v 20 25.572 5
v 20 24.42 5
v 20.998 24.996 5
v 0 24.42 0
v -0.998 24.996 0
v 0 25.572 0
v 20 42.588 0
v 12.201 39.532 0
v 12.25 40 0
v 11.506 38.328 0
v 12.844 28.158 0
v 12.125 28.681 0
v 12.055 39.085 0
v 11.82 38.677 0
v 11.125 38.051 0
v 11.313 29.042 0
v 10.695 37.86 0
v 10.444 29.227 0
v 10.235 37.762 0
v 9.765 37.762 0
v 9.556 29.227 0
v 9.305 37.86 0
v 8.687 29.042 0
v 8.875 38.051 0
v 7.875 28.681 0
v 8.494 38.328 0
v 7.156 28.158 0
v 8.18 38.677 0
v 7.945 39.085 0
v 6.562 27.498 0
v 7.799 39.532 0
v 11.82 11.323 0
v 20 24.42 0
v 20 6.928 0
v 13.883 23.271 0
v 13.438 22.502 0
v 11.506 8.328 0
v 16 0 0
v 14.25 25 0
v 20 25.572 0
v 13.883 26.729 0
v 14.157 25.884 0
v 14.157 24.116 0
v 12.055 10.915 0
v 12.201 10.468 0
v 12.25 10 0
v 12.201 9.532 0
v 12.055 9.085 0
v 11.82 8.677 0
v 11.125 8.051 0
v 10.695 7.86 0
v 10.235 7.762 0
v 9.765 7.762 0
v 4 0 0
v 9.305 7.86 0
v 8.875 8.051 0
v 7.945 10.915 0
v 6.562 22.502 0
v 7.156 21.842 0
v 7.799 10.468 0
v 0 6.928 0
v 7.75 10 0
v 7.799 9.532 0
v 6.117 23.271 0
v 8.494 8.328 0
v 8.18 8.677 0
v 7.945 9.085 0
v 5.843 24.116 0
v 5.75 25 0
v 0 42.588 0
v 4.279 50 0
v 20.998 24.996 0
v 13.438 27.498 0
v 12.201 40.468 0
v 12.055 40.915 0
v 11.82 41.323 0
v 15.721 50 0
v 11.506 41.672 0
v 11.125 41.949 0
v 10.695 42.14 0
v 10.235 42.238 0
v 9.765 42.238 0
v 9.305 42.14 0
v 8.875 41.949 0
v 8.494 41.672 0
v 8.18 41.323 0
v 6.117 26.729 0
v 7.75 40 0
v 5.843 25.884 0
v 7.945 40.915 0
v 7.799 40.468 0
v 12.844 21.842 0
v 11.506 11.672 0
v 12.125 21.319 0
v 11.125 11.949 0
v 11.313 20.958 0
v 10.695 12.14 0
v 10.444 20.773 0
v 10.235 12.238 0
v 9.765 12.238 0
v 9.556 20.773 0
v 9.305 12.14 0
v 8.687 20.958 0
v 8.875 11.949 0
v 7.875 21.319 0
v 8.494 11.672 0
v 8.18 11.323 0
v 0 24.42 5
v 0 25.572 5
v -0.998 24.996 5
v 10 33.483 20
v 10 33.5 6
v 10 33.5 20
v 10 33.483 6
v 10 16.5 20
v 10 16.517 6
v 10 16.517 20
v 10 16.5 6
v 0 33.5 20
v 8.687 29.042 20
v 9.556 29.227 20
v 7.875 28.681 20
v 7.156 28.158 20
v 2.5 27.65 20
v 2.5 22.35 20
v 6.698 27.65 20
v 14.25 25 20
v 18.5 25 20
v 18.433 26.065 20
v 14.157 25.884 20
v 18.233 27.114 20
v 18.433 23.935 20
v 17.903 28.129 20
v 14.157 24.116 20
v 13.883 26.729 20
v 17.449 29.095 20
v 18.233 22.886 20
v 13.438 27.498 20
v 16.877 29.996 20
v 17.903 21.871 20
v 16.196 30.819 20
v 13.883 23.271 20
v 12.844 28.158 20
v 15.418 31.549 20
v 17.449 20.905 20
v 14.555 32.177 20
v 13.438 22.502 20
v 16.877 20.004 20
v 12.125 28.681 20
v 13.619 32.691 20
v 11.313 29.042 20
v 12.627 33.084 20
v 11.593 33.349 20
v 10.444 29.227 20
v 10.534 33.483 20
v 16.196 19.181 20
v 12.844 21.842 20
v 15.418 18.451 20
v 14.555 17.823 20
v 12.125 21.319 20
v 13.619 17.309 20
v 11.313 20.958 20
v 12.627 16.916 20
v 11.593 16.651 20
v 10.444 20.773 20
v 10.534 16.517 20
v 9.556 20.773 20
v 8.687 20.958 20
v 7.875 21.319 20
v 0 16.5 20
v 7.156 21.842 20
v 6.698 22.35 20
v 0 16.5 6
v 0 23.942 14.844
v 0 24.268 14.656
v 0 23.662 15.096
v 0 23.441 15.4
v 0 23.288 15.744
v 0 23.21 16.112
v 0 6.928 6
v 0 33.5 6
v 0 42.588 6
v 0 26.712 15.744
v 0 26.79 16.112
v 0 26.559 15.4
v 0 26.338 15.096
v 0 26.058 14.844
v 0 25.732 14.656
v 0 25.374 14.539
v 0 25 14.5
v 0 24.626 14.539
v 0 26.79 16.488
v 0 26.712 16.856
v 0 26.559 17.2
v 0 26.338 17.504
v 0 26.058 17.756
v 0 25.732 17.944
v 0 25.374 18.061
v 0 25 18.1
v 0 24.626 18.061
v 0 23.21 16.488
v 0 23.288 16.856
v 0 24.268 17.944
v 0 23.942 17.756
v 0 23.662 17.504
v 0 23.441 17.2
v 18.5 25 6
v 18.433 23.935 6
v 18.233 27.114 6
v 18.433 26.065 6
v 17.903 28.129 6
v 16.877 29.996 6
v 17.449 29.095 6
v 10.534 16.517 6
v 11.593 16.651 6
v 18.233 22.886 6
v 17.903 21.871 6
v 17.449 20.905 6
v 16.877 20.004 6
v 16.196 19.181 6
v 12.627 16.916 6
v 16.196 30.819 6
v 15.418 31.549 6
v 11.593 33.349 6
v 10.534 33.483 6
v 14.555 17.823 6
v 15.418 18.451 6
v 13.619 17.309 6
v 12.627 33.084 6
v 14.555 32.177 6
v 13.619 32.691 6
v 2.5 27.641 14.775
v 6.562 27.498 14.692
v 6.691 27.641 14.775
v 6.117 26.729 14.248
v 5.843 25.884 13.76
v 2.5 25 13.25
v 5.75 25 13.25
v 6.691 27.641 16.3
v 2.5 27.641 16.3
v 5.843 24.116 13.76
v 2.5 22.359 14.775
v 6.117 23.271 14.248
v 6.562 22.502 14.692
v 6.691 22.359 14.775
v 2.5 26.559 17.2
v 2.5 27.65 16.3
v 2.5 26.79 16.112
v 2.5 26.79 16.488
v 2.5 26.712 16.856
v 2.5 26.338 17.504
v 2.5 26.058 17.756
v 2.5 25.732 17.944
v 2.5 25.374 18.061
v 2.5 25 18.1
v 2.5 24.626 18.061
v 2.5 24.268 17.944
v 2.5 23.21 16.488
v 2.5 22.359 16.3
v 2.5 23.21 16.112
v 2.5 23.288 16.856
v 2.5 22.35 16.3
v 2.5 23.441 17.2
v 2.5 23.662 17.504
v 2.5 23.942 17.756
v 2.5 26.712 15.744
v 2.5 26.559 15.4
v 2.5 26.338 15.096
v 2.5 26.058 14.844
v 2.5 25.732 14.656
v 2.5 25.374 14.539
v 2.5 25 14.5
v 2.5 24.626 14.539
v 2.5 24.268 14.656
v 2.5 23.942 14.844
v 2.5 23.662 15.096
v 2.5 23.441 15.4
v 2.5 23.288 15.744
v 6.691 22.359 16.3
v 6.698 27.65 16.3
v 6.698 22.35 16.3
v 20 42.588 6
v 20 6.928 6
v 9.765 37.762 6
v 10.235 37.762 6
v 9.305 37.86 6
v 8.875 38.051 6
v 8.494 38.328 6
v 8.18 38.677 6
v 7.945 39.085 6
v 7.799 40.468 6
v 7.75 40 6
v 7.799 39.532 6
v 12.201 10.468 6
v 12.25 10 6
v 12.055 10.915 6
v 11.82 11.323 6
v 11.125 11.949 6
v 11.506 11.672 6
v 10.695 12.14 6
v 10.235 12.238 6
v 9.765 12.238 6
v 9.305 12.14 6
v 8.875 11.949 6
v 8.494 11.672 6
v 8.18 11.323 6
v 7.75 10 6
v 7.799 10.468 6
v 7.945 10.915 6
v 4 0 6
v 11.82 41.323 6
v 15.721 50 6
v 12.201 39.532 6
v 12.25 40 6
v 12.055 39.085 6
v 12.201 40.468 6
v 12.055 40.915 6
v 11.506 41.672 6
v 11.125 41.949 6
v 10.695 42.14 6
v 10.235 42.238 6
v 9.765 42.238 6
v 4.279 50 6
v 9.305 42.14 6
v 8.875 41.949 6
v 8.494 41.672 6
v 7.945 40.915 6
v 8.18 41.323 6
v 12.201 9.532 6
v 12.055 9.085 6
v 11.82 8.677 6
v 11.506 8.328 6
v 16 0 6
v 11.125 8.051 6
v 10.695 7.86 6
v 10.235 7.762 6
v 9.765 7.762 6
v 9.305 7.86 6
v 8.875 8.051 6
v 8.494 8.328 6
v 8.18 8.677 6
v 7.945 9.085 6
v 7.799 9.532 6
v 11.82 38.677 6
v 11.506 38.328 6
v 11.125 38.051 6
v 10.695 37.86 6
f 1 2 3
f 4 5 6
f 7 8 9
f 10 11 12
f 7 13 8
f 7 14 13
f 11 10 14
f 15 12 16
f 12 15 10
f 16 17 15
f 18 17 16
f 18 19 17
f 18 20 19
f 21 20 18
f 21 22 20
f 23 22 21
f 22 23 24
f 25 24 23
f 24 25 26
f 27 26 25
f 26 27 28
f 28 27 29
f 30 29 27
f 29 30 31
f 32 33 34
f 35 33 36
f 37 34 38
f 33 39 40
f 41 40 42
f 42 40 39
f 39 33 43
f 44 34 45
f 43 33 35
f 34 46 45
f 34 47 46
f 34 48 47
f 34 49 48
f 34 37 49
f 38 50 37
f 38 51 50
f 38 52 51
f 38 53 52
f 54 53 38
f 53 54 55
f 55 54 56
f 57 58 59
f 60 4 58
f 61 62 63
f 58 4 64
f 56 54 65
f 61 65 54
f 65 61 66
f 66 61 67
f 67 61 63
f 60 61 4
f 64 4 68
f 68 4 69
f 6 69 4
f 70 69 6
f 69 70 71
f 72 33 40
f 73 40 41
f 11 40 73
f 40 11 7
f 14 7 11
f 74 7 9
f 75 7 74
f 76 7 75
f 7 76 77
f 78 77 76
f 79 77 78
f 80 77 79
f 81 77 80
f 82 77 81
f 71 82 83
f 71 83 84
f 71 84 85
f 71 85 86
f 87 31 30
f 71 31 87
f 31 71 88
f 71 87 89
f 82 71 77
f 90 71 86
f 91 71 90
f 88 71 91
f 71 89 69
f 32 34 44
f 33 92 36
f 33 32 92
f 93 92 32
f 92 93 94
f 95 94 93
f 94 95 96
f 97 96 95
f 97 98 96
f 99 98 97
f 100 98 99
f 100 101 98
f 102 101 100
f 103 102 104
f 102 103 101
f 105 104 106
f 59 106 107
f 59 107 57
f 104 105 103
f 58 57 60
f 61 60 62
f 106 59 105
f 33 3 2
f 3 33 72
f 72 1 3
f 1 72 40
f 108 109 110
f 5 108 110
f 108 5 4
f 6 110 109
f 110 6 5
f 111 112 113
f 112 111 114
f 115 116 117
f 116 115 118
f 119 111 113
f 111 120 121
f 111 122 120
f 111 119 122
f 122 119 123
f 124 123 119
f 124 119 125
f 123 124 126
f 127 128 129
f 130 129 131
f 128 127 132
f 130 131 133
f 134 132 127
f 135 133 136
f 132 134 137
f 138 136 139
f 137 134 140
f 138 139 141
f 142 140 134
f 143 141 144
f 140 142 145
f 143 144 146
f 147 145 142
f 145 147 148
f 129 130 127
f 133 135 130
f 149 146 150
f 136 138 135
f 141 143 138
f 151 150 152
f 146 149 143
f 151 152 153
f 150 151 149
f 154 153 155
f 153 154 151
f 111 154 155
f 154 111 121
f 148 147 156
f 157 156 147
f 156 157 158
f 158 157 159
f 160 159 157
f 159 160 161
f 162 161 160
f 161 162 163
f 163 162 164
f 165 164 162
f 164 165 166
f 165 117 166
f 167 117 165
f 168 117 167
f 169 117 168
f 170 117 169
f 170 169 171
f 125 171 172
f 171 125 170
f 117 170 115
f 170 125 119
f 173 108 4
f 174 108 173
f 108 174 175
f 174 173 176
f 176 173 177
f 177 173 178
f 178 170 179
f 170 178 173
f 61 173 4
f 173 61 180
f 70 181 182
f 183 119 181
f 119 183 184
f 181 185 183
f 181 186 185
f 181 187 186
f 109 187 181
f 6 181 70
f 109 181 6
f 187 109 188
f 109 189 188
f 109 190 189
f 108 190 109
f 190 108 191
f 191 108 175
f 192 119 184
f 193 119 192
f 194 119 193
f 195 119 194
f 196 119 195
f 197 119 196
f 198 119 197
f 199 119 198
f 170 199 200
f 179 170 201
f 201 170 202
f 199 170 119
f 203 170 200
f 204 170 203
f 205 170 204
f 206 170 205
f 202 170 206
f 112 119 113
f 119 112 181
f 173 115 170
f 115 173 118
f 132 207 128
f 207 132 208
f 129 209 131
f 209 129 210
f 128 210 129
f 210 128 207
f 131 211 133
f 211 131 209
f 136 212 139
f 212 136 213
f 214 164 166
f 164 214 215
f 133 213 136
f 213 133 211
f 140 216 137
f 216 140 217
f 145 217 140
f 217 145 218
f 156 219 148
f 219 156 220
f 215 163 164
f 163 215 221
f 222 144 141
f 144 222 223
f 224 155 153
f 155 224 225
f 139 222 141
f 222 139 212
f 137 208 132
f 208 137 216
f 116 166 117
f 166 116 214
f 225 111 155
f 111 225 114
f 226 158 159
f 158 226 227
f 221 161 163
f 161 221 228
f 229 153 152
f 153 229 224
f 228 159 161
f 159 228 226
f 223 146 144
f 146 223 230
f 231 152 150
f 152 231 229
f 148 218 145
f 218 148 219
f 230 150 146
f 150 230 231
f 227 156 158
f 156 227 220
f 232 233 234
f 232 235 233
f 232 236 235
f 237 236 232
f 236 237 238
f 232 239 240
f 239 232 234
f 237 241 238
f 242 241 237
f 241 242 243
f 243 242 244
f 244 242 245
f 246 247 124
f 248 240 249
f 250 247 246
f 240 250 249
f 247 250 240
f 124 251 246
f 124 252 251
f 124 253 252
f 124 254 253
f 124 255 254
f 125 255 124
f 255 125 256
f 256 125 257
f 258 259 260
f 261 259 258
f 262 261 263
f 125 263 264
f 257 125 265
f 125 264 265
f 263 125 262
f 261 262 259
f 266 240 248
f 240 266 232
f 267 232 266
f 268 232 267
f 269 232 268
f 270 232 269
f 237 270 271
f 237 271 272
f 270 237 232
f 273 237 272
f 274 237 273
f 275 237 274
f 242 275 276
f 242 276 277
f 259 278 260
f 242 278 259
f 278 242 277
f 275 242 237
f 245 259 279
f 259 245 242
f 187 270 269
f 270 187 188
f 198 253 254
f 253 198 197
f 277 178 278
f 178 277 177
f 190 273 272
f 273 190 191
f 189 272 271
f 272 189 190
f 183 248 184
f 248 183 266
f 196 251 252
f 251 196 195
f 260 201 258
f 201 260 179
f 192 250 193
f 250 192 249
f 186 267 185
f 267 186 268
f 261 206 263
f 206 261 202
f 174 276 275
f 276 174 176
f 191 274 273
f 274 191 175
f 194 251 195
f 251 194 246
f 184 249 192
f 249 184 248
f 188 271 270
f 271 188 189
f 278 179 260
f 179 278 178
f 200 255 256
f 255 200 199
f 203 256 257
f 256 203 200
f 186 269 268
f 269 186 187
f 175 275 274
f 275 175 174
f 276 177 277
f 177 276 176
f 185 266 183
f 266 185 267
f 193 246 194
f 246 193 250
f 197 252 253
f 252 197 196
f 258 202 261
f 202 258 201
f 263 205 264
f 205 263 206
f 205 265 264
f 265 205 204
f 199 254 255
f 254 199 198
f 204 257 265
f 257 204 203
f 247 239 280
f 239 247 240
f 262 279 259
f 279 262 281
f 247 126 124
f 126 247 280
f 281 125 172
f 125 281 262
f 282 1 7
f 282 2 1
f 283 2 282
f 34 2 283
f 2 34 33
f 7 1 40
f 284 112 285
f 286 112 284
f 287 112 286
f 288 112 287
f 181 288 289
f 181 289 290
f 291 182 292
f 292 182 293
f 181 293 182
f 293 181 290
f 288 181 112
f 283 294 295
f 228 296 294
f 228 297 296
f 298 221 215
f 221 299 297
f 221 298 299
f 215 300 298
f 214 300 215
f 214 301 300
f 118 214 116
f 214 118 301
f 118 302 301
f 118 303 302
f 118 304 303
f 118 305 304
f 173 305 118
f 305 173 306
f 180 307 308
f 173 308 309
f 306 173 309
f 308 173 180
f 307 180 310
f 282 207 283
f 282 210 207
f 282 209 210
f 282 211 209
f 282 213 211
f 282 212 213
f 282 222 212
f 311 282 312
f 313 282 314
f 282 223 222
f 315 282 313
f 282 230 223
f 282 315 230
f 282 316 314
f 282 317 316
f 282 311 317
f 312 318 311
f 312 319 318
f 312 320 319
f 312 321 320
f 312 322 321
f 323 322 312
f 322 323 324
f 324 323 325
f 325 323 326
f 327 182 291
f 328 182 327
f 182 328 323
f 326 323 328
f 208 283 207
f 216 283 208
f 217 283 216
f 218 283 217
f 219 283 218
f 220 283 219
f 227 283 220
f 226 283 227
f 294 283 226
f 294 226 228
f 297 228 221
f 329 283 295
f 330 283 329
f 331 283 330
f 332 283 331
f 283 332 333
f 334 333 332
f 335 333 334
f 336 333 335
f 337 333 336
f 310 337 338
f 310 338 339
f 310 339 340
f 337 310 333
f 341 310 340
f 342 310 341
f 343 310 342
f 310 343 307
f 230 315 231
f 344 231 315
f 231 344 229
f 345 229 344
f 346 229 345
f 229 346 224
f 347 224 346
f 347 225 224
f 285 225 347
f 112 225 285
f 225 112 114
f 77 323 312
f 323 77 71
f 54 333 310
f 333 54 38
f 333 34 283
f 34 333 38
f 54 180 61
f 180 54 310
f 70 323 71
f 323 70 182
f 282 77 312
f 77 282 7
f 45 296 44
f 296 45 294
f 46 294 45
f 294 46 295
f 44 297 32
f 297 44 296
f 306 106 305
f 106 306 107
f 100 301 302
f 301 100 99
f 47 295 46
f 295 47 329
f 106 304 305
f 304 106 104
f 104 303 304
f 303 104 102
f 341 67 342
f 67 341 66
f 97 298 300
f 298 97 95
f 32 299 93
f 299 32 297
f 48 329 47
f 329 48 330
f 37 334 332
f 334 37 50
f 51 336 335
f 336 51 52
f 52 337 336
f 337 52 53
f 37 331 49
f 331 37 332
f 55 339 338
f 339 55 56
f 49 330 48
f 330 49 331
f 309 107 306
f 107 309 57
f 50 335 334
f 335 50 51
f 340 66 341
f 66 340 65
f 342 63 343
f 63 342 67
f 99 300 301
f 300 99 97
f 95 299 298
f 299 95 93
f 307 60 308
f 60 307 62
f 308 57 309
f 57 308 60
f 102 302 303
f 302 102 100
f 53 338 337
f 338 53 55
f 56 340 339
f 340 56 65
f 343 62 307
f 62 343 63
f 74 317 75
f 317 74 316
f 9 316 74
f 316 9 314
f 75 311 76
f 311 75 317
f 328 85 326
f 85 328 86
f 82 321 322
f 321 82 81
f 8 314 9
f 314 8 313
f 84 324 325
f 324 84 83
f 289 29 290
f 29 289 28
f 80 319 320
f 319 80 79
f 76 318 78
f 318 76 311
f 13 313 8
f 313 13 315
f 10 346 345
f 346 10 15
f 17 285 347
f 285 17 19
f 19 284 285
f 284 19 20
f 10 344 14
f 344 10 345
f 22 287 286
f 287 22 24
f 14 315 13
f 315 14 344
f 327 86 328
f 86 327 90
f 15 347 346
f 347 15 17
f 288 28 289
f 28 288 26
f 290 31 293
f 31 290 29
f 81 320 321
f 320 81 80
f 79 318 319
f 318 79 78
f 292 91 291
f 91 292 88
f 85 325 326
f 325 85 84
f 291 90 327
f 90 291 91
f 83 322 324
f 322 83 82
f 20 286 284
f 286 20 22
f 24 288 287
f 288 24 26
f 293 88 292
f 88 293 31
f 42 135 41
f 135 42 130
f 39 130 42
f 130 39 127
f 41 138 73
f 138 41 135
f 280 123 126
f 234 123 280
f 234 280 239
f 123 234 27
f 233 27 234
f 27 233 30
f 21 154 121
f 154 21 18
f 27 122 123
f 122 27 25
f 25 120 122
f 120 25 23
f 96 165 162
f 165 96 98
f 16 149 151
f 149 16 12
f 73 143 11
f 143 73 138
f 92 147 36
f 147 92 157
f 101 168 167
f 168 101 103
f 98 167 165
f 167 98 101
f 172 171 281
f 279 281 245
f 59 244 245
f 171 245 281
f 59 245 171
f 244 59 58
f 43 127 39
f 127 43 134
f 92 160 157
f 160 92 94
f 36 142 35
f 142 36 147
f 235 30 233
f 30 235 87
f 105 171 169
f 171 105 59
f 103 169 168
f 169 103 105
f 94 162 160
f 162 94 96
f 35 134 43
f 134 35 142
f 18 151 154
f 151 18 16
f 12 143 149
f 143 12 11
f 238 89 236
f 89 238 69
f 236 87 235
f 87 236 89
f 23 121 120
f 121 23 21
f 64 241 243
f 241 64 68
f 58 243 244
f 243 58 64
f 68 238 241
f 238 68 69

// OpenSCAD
// file: metric.scad
// PRUSA Mendel  
// Default metric sizes
// GNU GPL v3
// Josef Průša
// josefprusa@me.com
// prusadjs.cz
// http://www.reprap.org/wiki/Prusa_Mendel
// http://github.com/prusajr/PrusaMendel

// DONT CHANGE THIS FILE! ALTER VALUES IN CONFIGURATION.SCAD INSTEAD

// RODS

threaded_rod_diameter = 8.7;
threaded_rod_diameter_horizontal = 8.7;
smooth_bar_diameter = 8;
smooth_bar_diameter_horizontal = 8.5;

// Nuts and bolts

m8_diameter = 9;
m8_nut_diameter = 14.1;

m4_diameter = 4.5;
m4_nut_diameter = 8.5;

m3_diameter = 3.6;
m3_nut_diameter = 5.3;
m3_nut_diameter_horizontal = 6.1;

// Bushing holder

bushing_core_diameter = smooth_bar_diameter;
bushing_material_thickness = 1;

// Motors

motor_shaft = 5.5;
// main file
// C. Strang		
// cstrang@????
// funfor.us

h = 6;       	// base thickness
m = h-1;	// marker height
o = 0.1;	//  overlap amount
hh = 14;	// bar holder height


include <metric.scad>;

m3=m3_diameter;
m3n=m3_nut_diameter_horizontal;
m4=m4_diameter ; 
m8=smooth_bar_diameter_horizontal;

$fn=30;

translate([0,0,0]) yzrodholder();

module yzrodholder()
{
	difference()
	{
		union()
		{
			translate([0,0,0]) rotate([0,0,0]) cube([20,50,h]);
			translate([20-0.1,24.4,0]) marker();
			translate([0.1,24.4,0]) mirror() marker();
			translate([0,16.5,h-o]) rodholder();
		}
		translate([16,0,-o]) rotate([0,0,-30]) cube([10,10,h+2*o]);
		translate([4,0,-o]) mirror() rotate([0,0,-30]) cube([10,10,h+2*o]);
		translate([-9,47,-o]) rotate([0,0,-30]) cube([10,10,h+2*o]);
		translate([29,47,-o]) mirror() rotate([0,0,-30]) cube([10,10,h+2*o]);
		translate([10,10,-o]) cylinder(r=m4/2,h=h+4);
		translate([10,40,-o]) cylinder(r=m4/2,h=h+4);
		translate([10,25,-o]) cylinder(r=m8/2,h=h+hh+4);
	}

}

module marker()
{
	difference()
	{
		cube([1.1,1.2,m]);
		translate([1,-1.77,-o]) rotate([0,0,30]) cube([2,2,m+2*o]);
		translate([0,1.23,-o]) rotate([0,0,-30]) cube([2,2,m+2*o]);
	}
}

module rodholder()
{
	difference()
	{
		union()
		{
			translate([0,0,0]) rotate([0,0,0]) cube([10,17,hh+o]);
			translate([10,8.5,0]) cylinder(r=(m8),h=hh+o,$fn=50);
		}
		translate([2.5,8.5,10.4]) rotate([90,90,90]) cylinder(r=m3n/2,h=5,$fn=6);
		translate([-0.1,8.5,10.4]) rotate([90,90,90]) cylinder(r=m3/2,h=9);
		translate([2.5,5.85,10.4]) rotate([0,0,0]) cube([5,m3n-0.8,m3n]);

	}
}
